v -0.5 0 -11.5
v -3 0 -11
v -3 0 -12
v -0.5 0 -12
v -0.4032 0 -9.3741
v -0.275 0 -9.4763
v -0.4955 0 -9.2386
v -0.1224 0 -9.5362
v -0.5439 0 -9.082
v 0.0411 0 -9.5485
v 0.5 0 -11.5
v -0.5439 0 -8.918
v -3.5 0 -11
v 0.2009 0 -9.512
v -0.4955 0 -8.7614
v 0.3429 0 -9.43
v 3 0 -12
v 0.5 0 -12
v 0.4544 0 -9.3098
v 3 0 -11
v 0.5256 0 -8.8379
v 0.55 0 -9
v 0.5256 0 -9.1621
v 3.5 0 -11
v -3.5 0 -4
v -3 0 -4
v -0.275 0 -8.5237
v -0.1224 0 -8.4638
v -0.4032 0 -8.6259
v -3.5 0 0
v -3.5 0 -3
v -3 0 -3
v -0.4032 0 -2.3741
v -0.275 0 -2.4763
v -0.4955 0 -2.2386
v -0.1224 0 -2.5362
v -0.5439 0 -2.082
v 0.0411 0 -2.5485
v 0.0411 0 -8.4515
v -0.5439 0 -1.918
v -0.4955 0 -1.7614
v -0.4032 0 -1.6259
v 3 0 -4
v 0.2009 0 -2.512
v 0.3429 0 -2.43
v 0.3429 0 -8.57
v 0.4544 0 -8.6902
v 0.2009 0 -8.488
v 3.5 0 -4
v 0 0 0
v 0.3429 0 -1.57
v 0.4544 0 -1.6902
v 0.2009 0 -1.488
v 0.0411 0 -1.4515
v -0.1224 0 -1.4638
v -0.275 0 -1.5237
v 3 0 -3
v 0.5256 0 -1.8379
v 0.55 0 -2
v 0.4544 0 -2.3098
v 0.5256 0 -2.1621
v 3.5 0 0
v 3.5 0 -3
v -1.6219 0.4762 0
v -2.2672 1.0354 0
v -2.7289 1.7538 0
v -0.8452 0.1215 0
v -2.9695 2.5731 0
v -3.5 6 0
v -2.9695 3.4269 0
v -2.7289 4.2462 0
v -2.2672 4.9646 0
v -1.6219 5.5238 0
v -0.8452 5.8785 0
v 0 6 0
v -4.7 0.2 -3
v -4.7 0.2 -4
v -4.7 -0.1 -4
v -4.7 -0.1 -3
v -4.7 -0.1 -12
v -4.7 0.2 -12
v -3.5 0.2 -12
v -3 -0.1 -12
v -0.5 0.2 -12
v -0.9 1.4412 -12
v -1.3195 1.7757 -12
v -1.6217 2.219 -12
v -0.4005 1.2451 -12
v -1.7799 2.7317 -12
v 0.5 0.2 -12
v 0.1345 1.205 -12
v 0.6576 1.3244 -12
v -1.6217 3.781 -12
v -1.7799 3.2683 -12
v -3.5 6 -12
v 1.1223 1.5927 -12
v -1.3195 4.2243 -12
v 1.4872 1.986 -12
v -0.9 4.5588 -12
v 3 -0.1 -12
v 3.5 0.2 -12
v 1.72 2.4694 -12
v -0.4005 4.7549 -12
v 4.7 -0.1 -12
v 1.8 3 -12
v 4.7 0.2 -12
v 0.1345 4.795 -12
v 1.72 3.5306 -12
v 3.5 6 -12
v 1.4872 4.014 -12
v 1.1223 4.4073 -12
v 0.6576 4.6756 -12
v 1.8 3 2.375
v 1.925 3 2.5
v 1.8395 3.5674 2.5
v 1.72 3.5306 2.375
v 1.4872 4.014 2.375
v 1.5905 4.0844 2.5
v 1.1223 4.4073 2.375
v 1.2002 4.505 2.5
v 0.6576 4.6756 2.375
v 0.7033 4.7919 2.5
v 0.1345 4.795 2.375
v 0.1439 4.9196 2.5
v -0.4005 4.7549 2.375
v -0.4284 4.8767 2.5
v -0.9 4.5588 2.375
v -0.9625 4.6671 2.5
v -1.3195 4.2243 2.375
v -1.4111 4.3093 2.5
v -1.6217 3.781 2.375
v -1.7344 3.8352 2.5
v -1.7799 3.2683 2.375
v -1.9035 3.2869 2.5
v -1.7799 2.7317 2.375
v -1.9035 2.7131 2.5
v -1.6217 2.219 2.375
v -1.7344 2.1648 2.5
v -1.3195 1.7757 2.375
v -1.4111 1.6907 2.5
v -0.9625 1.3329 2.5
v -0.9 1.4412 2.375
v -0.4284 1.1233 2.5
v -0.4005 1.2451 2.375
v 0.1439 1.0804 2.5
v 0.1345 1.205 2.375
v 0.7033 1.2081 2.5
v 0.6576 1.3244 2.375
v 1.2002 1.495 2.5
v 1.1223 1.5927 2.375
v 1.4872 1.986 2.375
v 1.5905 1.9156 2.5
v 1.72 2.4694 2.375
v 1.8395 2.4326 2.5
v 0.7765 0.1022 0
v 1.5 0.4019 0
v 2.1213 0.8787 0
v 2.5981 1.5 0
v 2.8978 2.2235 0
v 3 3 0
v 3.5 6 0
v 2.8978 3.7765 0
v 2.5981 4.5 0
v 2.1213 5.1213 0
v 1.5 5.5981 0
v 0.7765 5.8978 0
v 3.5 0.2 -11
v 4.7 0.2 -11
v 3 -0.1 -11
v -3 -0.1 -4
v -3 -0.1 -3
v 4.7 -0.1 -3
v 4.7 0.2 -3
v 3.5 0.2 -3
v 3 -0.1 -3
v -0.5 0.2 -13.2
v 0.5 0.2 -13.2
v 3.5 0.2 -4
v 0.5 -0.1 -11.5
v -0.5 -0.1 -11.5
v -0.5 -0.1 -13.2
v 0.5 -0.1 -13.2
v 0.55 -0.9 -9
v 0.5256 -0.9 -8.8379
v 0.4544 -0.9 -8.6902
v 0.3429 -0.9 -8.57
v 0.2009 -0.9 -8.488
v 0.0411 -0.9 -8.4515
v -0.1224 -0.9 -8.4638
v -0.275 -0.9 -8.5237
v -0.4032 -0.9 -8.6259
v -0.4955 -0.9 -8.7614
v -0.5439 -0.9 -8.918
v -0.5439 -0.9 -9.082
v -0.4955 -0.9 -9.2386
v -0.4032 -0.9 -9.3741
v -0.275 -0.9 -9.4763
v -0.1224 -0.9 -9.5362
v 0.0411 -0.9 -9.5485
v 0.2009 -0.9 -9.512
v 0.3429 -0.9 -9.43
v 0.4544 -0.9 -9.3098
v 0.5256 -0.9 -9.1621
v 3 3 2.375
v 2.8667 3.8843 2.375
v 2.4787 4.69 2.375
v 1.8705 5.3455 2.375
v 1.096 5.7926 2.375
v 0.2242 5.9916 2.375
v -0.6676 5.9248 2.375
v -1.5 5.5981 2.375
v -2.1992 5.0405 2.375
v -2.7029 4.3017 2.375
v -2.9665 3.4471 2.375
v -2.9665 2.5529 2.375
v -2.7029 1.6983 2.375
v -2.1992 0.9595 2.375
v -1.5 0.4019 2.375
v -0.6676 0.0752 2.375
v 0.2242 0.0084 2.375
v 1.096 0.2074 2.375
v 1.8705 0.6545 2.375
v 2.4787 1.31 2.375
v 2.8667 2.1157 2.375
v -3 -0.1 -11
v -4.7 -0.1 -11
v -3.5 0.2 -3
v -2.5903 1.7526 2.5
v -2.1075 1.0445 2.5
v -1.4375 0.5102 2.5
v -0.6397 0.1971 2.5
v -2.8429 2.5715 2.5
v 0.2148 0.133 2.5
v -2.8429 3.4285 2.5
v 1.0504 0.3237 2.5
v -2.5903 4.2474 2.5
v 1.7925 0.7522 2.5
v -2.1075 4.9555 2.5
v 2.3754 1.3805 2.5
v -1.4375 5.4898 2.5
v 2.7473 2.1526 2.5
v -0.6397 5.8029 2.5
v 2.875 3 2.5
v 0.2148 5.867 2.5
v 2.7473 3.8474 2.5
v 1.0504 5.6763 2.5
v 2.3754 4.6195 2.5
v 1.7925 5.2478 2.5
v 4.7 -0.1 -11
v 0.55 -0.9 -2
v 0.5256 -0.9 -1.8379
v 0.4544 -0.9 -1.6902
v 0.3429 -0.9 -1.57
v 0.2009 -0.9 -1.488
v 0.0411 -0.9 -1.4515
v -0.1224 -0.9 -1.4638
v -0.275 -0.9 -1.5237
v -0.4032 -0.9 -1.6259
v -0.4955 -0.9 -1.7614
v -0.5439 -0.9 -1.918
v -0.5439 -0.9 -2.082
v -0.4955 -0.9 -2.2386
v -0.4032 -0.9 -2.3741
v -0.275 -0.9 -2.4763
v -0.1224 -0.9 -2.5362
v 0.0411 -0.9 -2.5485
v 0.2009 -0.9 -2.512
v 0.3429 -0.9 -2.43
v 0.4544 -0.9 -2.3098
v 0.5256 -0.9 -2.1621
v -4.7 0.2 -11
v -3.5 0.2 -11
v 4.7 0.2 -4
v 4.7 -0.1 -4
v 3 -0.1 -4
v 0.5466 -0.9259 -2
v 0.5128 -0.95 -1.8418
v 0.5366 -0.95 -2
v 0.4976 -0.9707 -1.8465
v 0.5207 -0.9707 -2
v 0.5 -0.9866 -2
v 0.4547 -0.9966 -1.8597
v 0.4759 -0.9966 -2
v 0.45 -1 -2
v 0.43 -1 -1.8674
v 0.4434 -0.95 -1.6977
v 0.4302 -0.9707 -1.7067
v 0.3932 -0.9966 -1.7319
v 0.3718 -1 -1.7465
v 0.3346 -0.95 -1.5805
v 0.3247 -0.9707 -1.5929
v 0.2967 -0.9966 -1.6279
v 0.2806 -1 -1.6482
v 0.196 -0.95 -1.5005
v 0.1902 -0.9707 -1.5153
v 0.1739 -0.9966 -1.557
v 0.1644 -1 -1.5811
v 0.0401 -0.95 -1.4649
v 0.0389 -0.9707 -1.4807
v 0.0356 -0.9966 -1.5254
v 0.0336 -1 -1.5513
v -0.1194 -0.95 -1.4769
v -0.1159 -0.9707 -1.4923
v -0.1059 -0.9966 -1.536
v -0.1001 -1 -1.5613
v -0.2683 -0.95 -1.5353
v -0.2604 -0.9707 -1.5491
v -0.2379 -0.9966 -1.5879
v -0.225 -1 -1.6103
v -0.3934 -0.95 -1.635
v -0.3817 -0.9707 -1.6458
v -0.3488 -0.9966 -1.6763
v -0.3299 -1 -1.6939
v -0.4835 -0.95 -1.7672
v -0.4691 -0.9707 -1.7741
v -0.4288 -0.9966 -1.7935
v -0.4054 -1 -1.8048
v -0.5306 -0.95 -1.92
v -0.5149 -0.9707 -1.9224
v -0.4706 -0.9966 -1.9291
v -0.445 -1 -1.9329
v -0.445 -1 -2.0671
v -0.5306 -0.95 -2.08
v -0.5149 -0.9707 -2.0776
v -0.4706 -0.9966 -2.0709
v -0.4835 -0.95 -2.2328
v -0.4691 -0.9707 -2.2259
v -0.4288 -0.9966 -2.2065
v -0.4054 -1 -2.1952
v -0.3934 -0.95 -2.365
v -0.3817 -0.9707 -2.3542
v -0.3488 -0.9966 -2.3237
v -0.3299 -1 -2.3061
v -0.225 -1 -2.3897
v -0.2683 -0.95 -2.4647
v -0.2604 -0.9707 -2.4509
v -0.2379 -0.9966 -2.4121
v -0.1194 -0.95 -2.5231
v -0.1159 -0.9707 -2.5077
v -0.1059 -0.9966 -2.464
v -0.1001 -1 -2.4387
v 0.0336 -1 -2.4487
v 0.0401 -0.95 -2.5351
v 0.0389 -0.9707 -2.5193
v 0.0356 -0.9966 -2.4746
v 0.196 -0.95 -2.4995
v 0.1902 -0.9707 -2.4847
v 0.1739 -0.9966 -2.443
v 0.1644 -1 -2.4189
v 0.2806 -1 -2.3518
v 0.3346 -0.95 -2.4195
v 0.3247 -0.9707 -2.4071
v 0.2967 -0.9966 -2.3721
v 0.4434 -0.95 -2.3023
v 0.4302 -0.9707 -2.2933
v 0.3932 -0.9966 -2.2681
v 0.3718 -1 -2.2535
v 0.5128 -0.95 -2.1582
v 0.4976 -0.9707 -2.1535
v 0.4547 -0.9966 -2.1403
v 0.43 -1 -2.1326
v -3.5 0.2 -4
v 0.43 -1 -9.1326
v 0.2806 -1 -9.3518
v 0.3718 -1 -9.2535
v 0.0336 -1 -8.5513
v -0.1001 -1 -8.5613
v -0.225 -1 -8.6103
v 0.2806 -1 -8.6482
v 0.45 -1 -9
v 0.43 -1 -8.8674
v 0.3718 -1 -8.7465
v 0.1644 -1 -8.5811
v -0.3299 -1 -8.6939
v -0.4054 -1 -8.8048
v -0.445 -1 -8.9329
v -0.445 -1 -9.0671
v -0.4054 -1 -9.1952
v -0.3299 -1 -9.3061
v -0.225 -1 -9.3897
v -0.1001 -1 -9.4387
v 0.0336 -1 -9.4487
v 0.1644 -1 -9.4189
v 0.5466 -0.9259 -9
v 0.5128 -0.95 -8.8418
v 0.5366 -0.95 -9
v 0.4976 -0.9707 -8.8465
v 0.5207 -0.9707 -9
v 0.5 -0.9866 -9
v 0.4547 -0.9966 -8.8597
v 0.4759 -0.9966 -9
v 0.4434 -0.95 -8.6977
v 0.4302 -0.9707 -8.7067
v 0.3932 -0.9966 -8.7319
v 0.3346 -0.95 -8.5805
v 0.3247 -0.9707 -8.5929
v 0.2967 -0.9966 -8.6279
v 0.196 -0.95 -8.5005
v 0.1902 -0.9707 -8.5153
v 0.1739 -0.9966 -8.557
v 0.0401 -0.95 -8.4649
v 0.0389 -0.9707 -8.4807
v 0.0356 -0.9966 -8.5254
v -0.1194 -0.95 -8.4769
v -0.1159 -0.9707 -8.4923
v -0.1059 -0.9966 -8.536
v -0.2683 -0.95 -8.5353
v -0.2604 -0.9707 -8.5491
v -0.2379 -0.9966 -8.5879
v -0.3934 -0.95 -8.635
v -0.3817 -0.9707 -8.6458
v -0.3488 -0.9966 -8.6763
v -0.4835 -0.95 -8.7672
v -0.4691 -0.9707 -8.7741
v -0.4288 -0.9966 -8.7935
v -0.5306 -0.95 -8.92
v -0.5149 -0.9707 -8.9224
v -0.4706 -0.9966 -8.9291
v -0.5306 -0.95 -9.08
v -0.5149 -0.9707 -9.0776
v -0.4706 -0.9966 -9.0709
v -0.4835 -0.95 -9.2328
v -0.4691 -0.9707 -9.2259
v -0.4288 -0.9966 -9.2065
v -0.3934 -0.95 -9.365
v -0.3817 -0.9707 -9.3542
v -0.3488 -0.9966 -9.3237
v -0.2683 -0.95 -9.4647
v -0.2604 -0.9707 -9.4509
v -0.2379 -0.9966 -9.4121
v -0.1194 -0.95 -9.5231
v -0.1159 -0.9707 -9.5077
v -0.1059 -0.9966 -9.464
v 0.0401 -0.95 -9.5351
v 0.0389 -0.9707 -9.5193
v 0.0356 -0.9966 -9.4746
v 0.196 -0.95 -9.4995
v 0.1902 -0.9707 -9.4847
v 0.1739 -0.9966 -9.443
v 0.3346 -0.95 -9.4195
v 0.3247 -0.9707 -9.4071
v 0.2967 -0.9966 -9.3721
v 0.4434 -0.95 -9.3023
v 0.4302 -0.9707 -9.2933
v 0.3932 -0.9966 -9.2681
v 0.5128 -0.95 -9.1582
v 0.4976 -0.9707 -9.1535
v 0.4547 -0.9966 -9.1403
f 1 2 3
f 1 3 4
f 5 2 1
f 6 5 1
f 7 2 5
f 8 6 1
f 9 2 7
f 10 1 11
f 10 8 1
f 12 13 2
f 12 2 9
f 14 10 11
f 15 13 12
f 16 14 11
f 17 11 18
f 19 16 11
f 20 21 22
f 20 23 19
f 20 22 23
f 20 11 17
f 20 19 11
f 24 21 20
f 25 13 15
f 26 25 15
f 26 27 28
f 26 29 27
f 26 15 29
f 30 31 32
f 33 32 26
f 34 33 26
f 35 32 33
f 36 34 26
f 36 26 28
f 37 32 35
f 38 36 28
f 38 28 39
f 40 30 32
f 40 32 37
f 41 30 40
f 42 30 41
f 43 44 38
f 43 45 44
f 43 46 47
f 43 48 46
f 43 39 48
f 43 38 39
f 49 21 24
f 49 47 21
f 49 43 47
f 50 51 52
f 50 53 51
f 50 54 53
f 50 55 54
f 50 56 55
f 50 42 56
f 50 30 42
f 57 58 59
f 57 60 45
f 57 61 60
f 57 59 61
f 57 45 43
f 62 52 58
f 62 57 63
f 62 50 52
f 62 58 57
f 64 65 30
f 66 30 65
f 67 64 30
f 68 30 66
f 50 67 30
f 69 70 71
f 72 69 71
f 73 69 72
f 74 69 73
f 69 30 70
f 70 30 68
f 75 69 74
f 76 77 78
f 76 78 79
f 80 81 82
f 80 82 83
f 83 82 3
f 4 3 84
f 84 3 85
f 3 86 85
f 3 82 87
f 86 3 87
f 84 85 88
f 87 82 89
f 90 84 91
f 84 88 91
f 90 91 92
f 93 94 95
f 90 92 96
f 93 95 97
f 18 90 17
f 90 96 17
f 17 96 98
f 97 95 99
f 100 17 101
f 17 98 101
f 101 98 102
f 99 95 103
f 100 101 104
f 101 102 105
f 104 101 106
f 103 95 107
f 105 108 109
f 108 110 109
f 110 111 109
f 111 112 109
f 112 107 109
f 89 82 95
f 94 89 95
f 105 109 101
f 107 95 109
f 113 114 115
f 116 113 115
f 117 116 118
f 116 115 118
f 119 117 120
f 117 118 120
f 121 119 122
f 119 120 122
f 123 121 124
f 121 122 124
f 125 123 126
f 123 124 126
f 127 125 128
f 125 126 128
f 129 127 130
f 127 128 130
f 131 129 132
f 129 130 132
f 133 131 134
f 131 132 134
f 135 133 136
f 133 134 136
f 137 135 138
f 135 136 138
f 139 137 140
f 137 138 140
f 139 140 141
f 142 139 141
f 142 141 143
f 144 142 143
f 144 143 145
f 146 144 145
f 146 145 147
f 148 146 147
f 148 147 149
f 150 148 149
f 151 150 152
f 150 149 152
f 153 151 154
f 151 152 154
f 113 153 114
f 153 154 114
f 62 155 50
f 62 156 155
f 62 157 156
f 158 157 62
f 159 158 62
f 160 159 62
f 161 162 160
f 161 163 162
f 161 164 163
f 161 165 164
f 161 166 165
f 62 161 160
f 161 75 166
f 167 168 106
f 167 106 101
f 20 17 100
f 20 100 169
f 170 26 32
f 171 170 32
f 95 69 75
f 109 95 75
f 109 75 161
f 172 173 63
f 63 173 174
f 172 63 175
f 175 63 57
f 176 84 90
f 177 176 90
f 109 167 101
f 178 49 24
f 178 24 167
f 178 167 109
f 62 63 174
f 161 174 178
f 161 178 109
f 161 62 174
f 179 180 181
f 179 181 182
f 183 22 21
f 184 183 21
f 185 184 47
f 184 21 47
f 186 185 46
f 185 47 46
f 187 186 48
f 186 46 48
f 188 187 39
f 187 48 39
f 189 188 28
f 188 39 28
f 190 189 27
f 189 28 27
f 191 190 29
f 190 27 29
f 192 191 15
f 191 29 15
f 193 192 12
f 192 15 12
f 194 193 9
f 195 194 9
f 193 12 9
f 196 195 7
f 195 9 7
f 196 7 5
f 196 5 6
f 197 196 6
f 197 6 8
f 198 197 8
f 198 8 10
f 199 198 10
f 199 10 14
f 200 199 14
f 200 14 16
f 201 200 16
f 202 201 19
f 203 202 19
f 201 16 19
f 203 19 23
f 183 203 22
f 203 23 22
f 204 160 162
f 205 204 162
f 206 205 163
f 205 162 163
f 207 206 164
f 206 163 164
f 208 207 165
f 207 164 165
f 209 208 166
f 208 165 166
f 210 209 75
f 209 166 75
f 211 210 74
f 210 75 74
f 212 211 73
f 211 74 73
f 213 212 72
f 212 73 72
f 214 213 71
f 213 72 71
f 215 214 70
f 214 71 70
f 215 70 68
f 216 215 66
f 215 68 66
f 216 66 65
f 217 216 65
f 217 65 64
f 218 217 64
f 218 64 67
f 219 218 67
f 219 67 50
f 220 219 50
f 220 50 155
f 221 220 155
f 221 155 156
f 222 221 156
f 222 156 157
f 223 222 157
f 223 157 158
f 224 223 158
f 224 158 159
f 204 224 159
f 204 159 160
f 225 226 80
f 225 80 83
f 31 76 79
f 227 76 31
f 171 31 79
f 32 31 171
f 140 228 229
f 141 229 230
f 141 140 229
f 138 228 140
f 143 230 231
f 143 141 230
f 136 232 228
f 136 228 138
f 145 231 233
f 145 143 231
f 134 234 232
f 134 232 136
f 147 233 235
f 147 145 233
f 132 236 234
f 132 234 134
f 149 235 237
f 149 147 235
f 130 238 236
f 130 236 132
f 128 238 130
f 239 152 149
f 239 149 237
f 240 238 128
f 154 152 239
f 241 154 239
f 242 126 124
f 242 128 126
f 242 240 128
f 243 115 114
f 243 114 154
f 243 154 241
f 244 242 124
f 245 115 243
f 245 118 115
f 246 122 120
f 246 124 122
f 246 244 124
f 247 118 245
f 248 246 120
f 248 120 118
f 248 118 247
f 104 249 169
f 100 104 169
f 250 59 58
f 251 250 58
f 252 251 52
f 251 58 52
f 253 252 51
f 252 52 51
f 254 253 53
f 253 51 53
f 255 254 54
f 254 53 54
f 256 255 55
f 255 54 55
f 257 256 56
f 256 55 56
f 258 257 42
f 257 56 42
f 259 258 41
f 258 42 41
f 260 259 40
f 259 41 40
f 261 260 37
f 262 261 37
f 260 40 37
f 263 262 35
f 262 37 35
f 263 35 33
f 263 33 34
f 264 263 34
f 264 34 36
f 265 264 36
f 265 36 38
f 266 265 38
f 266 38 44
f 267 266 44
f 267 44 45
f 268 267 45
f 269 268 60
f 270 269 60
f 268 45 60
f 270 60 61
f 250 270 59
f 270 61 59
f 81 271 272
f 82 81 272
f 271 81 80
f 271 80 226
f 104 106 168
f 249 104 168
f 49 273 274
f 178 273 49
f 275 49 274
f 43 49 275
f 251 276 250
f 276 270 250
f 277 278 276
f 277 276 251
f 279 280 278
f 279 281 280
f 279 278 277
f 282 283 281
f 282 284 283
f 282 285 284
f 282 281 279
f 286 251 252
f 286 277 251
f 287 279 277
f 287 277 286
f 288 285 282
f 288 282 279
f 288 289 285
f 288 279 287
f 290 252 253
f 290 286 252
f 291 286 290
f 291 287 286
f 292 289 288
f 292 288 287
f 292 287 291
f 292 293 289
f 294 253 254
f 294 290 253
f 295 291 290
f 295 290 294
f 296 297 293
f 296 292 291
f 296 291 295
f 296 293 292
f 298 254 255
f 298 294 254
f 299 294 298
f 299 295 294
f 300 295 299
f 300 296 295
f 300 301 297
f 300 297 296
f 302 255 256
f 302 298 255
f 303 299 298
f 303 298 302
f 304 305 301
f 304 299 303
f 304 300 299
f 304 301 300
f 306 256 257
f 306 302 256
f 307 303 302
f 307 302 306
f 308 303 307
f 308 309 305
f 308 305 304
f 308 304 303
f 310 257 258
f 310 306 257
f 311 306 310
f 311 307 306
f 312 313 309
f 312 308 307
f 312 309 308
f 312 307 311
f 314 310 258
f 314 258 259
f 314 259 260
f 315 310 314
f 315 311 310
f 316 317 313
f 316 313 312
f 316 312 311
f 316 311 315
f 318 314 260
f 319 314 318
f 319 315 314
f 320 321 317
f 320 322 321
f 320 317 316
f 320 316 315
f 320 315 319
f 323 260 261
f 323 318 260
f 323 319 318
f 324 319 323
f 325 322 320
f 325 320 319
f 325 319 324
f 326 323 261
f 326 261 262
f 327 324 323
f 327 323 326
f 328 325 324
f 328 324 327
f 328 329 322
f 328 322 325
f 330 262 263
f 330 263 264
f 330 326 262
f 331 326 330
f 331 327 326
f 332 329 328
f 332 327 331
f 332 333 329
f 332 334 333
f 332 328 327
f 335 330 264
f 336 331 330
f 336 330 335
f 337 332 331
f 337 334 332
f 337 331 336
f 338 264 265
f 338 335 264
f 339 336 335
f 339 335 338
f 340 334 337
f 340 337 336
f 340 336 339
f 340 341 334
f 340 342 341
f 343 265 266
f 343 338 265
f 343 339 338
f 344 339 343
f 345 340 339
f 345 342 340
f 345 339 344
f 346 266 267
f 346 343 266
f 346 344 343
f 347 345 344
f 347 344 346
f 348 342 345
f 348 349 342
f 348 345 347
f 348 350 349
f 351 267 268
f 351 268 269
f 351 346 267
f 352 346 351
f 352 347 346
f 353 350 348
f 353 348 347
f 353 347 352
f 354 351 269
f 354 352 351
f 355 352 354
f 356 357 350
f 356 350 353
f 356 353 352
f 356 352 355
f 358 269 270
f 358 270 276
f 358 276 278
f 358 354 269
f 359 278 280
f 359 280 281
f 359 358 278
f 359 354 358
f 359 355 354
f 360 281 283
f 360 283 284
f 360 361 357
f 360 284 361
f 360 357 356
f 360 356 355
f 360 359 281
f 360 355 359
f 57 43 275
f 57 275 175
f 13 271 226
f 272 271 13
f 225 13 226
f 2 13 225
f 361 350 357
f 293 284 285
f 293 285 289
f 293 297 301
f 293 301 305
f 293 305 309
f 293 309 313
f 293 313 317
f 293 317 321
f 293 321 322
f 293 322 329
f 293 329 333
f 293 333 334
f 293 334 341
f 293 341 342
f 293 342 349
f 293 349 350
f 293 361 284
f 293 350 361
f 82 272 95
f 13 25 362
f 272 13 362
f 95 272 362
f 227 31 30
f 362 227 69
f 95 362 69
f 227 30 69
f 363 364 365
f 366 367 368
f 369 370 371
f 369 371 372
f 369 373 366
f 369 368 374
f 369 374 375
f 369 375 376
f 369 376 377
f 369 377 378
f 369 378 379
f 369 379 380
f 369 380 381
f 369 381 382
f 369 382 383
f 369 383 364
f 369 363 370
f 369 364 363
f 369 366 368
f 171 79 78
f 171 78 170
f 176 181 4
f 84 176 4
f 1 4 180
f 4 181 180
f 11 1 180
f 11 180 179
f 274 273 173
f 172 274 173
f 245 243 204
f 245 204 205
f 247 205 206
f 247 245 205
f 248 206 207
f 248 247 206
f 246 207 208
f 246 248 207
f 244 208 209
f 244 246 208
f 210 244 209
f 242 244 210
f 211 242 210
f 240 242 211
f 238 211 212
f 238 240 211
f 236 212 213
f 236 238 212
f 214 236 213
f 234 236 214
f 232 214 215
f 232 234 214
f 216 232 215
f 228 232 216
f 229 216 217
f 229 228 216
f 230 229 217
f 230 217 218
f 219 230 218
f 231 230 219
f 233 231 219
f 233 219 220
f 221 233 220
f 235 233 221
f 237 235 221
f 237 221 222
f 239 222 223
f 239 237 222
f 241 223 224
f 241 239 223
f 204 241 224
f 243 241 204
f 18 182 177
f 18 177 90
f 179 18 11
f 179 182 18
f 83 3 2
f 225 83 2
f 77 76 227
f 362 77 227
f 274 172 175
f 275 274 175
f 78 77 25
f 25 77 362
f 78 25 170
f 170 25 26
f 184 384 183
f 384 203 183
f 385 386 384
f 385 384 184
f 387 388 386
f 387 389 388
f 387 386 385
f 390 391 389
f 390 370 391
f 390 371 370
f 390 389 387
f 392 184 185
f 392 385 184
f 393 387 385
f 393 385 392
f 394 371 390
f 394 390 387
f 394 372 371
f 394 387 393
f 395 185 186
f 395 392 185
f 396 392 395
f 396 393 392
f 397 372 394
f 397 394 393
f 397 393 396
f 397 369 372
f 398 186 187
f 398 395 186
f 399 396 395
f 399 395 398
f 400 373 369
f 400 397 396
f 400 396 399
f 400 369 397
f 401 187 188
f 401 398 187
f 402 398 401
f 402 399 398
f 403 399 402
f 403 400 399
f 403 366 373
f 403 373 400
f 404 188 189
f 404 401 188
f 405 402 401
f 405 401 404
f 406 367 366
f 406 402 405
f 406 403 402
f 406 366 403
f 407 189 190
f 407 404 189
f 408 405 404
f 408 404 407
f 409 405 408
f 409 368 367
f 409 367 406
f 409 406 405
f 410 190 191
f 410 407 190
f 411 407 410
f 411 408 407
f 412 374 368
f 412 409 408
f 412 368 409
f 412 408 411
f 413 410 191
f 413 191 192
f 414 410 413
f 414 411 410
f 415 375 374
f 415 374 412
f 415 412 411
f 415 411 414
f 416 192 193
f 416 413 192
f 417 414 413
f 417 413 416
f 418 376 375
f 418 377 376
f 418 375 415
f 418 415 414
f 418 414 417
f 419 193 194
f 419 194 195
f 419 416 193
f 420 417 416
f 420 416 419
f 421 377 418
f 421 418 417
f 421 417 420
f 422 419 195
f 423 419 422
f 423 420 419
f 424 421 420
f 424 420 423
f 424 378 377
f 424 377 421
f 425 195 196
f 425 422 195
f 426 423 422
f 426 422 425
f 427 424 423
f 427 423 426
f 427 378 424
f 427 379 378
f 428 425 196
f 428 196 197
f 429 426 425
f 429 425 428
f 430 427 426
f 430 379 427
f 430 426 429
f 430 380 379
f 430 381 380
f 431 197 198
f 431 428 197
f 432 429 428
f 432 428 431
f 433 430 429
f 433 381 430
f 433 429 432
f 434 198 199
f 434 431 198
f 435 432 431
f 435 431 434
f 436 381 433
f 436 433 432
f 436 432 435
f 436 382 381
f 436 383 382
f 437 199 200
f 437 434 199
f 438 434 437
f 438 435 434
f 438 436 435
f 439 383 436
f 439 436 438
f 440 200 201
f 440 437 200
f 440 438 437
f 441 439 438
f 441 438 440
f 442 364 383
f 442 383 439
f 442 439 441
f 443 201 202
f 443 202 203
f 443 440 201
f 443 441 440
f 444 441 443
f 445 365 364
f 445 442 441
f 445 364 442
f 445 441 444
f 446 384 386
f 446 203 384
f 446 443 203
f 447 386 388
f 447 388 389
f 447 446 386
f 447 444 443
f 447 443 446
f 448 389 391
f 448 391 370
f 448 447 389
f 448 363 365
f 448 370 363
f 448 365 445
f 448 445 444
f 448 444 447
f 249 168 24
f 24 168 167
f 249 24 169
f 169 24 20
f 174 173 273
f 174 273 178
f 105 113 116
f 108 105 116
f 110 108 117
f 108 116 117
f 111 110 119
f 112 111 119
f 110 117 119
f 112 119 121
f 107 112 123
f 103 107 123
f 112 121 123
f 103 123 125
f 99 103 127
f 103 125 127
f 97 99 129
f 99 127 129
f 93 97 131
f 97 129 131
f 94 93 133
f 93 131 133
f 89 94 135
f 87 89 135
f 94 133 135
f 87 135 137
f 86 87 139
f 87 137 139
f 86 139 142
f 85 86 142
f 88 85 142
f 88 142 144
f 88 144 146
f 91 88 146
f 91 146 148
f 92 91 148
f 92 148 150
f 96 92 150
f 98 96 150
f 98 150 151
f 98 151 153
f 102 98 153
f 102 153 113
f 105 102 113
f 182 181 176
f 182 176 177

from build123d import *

# Parameters (mm, degrees)
ESQUISSE1_R             = 3
BOSS_EXTRU_1_DEPTH      = 2.5
ESQUISSE2_W             = 7
ESQUISSE2_H             = 6
BOSS_EXTRU_2_DEPTH      = 12
ESQUISSE4_R             = 1.8
ENL_V_MAT_EXTRU_2_DEPTH = 15.5
CHANFREIN2_SIZE         = 0.125
ESQUISSE5_R             = 0.55
BOSS_EXTRU_3_DEPTH      = 1
CONG_1_R                = 0.1
BOSS_EXTRU_4_START      = -0.2
ESQUISSE6_W             = 1.7
ESQUISSE6_H             = 1
BOSS_EXTRU_4_DEPTH      = 0.3
ESQUISSE7_W             = 1
ESQUISSE7_H             = 1.7
BOSS_EXTRU_5_DEPTH      = 0.1
BOSS_EXTRU_5_DEPTH_BACK = 0.2


with BuildPart() as part:
    # Esquisse1 → Boss.-Extru.1 (new body)
    with BuildSketch(Plane.XY):
        with Locations((0, 3)):
            Circle(ESQUISSE1_R)
    extrude(amount=BOSS_EXTRU_1_DEPTH)

    # Esquisse2 → Boss.-Extru.2 (add)
    with BuildSketch(Plane.XY):
        with Locations((0, 3)):
            Rectangle(ESQUISSE2_W, ESQUISSE2_H)
    extrude(amount=-BOSS_EXTRU_2_DEPTH)

    # Esquisse4 → Enlèv. mat.-Extru.2 (cut, through all)
    with BuildSketch(Plane.XY.offset(2.5)):
        with Locations((0, 3)):
            Circle(ESQUISSE4_R)
    extrude(amount=-ENL_V_MAT_EXTRU_2_DEPTH, mode=Mode.SUBTRACT)

    # Chanfrein2
    chanfrein2_edges = [part.edges().sort_by_distance(p)[0] for p in [
        (-1.8, 3, 2.5),
        (-3, 3, 2.5),
    ]]
    chamfer(chanfrein2_edges, length=CHANFREIN2_SIZE)

    # Esquisse5 → Boss.-Extru.3 (add)
    with BuildSketch(Plane.XZ):
        with Locations((0, -2)):
            Circle(ESQUISSE5_R)
        with Locations((0, -9)):
            Circle(ESQUISSE5_R)
    extrude(amount=BOSS_EXTRU_3_DEPTH)

    # Congé1
    cong_1_edges = [part.edges().sort_by_distance(p)[0] for p in [
        (-0.55, -1, -2),
        (-0.55, -1, -9),
    ]]
    fillet(cong_1_edges, radius=CONG_1_R)

    # Esquisse6 → Boss.-Extru.4 (add)
    with BuildSketch(Plane.XZ.offset(BOSS_EXTRU_4_START)):
        with Locations((-3.85, -3.5)):
            Rectangle(ESQUISSE6_W, ESQUISSE6_H)
        with Locations((-3.85, -11.5)):
            Rectangle(ESQUISSE6_W, ESQUISSE6_H)
    boss_extru_4 = extrude(amount=BOSS_EXTRU_4_DEPTH)

    # Symétrie1: Boss.-Extru.4 across plane
    add(boss_extru_4.mirror(Plane(origin=(0, 0, 0), x_dir=(0, 0, 1), z_dir=(1, 0, 0))))

    # Esquisse7 → Boss.-Extru.5 (add, two sides)
    with BuildSketch(Plane.XZ) as boss_extru_5_sk:
        with Locations((0, -12.35)):
            Rectangle(ESQUISSE7_W, ESQUISSE7_H)
    extrude(amount=BOSS_EXTRU_5_DEPTH)
    extrude(boss_extru_5_sk.sketch, amount=-BOSS_EXTRU_5_DEPTH_BACK)


solid = part.part
